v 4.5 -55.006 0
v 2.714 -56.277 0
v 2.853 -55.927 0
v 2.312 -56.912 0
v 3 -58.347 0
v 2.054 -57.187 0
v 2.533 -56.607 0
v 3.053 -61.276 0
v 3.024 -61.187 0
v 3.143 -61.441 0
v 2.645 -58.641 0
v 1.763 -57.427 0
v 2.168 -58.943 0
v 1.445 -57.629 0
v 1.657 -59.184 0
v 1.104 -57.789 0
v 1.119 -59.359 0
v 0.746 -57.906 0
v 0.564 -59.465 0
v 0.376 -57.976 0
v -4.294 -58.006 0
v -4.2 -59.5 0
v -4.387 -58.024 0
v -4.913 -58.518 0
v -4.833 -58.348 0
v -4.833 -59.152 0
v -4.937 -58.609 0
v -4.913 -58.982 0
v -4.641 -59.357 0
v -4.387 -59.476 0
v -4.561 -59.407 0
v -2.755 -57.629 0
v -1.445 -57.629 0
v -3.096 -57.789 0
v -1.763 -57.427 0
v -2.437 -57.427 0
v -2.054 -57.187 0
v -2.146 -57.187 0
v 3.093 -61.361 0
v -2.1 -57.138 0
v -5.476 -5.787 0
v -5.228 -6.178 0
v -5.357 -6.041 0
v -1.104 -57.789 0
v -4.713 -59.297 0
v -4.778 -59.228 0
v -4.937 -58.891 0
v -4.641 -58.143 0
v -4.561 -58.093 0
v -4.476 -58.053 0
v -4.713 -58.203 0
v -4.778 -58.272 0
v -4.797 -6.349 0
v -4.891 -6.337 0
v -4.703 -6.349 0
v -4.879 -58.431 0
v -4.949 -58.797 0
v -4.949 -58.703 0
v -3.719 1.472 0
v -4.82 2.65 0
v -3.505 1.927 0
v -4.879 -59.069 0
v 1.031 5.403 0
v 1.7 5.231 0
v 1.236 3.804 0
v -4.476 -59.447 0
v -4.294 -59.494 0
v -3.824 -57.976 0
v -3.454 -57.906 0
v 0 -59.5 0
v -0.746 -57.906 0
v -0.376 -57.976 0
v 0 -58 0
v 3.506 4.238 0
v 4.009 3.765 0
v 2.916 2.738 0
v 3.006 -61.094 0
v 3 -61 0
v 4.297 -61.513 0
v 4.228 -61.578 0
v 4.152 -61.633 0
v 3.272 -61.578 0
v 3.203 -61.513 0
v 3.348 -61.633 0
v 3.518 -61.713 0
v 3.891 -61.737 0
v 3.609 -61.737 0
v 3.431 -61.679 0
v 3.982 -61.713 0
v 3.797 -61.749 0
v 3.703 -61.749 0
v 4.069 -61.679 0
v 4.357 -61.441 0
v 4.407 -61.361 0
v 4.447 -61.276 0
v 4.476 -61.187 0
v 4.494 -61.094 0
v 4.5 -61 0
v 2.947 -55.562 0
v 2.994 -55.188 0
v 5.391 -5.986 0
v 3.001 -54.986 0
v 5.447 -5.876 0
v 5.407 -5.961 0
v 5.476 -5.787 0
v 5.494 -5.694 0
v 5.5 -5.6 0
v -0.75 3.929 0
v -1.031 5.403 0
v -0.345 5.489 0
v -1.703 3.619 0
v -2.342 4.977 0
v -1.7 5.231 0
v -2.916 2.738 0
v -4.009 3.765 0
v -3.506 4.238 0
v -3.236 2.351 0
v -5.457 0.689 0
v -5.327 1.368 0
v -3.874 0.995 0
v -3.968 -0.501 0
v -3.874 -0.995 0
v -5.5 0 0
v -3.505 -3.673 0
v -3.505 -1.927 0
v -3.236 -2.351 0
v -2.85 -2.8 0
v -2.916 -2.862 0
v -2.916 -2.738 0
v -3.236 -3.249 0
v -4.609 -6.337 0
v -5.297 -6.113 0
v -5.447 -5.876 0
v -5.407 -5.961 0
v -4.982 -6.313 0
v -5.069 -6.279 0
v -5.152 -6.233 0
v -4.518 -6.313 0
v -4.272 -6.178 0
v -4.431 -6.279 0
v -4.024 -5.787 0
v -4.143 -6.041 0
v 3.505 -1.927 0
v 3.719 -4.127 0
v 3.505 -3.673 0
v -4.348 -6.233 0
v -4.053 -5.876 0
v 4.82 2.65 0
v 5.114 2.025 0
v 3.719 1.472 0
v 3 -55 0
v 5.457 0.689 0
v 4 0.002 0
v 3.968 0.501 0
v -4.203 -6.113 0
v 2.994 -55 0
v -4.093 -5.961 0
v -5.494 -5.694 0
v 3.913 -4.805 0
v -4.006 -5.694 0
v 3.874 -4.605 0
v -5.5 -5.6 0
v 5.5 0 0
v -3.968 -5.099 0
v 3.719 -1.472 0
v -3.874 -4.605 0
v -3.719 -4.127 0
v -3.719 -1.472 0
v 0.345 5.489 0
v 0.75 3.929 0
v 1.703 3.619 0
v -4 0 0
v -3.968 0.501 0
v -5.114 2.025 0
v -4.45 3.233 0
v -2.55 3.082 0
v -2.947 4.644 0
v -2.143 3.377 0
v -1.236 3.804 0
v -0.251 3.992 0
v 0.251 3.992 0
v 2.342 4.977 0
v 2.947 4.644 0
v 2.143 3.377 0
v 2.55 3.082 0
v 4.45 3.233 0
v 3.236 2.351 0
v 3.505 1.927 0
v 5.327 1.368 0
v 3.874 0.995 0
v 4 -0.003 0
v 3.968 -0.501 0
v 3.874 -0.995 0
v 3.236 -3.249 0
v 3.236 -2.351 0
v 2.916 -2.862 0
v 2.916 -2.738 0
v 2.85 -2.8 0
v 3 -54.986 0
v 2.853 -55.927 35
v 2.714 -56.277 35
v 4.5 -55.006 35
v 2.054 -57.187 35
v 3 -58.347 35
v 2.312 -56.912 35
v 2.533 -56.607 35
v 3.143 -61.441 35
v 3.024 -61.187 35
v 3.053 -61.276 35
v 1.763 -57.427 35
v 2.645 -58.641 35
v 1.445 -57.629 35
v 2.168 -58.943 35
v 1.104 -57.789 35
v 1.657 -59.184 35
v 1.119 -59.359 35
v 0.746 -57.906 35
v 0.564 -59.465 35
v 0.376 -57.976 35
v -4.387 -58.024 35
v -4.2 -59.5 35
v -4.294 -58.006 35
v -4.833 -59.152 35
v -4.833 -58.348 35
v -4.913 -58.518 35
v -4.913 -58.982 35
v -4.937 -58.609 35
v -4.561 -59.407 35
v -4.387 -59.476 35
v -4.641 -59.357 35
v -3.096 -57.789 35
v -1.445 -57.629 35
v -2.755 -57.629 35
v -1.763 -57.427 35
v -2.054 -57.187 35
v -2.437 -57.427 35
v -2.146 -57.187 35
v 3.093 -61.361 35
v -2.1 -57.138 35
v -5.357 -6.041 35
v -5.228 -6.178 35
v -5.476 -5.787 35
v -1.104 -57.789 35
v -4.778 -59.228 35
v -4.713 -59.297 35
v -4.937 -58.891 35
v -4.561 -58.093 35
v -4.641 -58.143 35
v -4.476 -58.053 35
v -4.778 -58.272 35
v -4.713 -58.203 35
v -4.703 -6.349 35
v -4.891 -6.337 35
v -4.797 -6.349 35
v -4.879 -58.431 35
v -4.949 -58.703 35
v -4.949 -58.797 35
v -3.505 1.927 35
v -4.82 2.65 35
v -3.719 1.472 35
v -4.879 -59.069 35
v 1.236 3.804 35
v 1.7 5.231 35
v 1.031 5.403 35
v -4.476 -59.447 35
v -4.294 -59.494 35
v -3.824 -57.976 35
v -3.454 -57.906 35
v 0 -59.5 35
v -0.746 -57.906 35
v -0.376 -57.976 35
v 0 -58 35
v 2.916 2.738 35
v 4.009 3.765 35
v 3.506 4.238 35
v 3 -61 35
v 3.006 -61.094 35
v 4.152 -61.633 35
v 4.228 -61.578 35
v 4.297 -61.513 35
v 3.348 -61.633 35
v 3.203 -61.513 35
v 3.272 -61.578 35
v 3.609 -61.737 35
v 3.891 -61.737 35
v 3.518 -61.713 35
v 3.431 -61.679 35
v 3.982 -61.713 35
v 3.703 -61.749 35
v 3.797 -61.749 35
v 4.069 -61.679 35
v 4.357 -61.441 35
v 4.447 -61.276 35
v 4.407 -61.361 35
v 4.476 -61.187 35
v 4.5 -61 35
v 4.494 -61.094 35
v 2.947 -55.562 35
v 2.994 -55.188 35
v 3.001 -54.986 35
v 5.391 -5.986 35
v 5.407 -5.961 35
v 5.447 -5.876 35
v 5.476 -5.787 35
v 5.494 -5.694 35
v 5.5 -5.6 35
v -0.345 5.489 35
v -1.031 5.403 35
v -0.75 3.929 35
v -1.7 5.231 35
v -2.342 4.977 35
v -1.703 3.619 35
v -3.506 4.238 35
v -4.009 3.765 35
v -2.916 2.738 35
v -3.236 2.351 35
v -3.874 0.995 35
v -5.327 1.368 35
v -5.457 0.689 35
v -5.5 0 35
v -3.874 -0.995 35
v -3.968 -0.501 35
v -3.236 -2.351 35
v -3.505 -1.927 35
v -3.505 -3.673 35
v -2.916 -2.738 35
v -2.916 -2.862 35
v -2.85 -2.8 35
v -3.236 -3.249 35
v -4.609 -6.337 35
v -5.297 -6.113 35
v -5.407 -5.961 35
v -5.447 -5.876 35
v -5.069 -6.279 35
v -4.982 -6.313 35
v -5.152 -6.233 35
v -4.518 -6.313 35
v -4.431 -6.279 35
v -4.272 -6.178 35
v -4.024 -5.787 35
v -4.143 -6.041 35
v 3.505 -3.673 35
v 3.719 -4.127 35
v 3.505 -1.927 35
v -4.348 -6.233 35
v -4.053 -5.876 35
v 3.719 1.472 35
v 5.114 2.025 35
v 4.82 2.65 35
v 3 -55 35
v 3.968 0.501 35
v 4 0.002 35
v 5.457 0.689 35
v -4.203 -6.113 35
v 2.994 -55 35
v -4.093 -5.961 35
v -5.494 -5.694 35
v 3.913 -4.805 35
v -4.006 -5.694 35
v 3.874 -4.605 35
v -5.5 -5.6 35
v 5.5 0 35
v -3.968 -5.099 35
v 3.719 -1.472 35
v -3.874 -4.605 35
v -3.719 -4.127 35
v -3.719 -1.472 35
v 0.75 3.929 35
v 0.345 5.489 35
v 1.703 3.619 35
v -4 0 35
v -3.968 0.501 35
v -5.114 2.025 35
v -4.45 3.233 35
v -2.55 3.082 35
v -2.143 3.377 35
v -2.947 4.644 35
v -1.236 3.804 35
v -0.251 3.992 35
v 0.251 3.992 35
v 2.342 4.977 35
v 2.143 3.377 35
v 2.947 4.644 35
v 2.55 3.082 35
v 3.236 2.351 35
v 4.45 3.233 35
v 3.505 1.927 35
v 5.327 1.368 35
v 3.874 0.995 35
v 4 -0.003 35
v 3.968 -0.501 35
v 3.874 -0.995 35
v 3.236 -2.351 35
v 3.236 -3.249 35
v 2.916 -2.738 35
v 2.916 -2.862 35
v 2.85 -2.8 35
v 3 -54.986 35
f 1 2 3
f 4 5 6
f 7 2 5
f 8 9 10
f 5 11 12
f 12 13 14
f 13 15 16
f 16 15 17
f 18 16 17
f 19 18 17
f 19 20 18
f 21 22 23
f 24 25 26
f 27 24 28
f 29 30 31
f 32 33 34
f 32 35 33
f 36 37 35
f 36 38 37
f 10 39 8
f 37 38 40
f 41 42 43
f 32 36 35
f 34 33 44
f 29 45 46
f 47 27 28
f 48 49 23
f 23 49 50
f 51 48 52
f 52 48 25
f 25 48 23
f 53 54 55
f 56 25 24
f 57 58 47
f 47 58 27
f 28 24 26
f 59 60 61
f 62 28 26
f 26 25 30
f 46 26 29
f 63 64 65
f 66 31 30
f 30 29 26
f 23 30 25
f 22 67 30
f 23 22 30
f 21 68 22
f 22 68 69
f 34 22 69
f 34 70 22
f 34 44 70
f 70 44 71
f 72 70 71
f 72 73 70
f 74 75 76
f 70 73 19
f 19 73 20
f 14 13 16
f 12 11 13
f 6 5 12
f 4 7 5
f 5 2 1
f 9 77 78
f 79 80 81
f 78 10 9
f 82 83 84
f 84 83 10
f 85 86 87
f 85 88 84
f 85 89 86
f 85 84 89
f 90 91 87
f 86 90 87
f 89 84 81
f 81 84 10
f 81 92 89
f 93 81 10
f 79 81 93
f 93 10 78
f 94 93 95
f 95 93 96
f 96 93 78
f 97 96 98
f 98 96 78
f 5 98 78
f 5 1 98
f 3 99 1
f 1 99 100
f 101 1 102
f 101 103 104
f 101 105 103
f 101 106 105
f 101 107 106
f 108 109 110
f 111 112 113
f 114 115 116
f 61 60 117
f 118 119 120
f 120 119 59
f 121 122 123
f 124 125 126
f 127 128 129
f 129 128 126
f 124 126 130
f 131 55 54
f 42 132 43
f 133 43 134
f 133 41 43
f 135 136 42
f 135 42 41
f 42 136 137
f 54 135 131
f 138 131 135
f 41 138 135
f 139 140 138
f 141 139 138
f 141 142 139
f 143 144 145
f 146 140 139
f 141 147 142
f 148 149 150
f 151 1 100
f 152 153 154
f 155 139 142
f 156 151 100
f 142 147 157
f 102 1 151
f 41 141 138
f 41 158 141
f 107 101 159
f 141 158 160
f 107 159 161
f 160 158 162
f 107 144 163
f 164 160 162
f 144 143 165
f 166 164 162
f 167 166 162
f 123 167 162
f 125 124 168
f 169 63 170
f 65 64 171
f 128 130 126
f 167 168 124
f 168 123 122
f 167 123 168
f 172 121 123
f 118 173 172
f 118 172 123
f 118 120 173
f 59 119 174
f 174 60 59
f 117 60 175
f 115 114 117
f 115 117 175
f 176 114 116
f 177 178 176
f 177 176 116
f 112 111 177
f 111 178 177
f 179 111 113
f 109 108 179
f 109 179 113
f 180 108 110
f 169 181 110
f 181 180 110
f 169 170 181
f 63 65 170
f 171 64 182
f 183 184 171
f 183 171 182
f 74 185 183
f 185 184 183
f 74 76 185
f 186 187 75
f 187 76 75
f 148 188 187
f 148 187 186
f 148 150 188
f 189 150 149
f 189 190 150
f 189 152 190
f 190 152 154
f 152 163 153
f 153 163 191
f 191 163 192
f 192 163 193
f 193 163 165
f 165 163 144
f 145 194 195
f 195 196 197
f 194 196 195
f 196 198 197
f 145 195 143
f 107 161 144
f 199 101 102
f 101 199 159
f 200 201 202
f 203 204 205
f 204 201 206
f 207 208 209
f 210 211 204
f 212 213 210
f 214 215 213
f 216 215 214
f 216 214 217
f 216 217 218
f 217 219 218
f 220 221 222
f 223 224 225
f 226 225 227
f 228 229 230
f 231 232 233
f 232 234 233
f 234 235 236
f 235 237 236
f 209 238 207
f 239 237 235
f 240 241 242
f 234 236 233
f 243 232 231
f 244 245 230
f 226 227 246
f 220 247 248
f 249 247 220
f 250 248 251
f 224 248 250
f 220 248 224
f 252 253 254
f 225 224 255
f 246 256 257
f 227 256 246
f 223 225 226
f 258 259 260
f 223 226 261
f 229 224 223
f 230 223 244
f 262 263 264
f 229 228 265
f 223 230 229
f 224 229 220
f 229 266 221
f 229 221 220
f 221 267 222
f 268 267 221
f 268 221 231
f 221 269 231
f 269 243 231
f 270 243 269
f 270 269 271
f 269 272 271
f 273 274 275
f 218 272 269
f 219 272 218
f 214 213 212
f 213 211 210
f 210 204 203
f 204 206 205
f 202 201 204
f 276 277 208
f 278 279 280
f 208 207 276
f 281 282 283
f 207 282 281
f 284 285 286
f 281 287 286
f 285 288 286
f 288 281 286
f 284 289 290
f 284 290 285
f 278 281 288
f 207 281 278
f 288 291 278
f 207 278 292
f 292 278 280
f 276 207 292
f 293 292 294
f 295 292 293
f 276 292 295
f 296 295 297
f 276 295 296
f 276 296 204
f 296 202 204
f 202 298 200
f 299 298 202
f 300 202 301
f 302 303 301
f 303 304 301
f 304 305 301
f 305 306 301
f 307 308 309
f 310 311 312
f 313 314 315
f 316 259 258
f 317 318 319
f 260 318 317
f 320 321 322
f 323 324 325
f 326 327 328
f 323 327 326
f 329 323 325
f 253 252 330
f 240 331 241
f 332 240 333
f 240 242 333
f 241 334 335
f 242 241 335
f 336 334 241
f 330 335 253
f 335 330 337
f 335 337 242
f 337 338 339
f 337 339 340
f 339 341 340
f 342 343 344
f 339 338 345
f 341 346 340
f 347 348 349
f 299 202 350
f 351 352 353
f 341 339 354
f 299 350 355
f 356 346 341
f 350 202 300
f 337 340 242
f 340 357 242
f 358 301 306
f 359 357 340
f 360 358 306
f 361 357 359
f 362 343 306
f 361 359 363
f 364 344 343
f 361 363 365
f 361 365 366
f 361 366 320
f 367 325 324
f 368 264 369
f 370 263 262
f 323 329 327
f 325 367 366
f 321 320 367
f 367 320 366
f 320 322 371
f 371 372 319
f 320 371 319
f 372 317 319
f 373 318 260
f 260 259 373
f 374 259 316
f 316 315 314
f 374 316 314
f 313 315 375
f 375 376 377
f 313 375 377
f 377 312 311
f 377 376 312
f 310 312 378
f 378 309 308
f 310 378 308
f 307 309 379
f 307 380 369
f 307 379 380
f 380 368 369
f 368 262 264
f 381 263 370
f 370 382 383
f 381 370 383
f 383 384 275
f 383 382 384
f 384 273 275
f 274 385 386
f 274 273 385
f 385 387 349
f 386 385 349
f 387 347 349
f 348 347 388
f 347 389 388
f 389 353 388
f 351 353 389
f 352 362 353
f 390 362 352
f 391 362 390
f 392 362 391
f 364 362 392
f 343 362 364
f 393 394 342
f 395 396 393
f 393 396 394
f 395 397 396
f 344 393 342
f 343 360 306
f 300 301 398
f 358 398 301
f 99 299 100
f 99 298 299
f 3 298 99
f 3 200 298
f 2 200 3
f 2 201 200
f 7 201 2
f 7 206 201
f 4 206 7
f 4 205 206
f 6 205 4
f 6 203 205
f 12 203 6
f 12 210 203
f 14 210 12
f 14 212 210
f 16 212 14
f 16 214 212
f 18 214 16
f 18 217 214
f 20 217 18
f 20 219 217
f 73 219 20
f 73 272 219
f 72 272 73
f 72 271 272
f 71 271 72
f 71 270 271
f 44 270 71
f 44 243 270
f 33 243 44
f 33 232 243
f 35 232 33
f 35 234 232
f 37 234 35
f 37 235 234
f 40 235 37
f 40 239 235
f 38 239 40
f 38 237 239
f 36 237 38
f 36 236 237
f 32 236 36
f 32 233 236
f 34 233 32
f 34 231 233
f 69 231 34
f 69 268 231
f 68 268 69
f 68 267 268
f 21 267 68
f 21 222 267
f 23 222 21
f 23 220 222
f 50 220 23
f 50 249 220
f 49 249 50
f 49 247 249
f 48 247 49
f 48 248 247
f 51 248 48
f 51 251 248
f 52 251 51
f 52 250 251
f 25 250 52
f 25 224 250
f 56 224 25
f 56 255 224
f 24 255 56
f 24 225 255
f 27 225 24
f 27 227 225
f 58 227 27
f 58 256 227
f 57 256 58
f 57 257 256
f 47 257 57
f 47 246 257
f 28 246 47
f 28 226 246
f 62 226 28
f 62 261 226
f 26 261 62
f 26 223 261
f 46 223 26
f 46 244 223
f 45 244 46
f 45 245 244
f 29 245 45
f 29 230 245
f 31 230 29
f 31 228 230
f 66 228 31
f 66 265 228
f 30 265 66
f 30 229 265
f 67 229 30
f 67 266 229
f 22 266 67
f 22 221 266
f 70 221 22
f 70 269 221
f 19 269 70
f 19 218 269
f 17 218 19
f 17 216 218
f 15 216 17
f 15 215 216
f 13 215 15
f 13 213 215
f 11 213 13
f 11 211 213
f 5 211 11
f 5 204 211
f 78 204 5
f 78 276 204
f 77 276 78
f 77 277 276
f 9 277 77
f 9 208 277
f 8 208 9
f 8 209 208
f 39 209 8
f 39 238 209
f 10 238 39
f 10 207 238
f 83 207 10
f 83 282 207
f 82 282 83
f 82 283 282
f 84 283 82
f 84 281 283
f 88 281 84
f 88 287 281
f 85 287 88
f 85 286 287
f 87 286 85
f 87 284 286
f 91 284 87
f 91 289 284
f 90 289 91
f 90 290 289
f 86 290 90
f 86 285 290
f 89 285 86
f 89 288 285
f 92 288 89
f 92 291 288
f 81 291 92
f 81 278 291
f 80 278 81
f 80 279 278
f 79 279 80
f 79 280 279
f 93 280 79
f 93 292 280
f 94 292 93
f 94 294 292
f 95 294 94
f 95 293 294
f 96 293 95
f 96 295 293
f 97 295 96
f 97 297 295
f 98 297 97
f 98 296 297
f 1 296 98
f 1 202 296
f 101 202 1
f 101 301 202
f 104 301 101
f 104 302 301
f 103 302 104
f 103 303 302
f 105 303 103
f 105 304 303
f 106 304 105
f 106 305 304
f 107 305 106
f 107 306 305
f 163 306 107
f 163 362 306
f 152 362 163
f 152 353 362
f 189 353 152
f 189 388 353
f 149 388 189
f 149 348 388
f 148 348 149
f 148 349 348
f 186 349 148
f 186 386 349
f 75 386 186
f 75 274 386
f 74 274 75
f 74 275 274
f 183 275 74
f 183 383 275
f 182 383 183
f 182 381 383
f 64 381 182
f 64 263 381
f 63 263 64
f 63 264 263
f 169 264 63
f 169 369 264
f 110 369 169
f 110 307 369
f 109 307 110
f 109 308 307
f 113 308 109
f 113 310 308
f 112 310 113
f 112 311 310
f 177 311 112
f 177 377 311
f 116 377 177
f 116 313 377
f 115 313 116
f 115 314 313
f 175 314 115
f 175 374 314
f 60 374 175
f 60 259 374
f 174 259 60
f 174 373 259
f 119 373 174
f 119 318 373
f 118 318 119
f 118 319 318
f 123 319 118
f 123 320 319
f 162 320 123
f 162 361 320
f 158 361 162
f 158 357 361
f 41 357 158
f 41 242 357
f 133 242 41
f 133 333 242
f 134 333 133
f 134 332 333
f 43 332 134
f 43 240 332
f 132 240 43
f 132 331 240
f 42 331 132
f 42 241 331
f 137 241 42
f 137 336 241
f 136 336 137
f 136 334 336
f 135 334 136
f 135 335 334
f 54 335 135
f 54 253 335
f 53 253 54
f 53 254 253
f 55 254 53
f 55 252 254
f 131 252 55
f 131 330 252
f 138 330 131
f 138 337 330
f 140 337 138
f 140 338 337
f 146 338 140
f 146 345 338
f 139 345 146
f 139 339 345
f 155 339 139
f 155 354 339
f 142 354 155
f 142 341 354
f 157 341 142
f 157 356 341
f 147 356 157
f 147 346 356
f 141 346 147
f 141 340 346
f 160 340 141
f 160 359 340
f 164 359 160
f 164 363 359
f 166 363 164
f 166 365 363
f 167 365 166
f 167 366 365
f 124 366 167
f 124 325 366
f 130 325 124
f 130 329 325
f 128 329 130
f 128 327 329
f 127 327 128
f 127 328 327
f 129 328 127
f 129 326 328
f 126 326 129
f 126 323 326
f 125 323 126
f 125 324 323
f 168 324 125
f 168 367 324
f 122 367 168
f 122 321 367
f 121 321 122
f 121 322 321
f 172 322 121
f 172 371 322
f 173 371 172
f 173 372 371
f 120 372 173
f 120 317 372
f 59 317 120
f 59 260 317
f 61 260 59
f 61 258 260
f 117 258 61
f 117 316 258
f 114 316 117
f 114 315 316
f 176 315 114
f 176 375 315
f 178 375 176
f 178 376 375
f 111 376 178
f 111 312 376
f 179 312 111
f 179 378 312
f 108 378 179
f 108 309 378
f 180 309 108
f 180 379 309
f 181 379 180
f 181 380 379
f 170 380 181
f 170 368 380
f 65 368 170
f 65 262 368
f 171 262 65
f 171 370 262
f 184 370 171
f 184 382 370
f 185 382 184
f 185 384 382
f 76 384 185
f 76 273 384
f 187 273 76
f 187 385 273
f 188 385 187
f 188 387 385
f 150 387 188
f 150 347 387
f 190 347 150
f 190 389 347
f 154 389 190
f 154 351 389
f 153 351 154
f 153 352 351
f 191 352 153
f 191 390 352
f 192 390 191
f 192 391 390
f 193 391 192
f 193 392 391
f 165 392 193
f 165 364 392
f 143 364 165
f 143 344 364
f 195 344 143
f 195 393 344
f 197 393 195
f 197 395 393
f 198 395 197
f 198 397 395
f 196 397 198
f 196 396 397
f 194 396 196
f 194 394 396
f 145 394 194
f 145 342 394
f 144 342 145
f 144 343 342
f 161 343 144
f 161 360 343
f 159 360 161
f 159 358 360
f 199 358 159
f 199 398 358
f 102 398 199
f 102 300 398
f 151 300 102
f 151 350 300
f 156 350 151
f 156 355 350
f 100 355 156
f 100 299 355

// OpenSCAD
// This is the overal width of the clip
ZExtrude = 35; // 
// This is the diameter of the top bar
topdia = 8; //
// This is the diameter of the bottom bar
bottomDiam = 6; //
// This is the distance between the top and bottom bar, as centres
spacebetween = 55;//
// This Chooses the thickness of the material
Thickness = 1.5;

linear_extrude(ZExtrude) {

Clip(topdia,bottomDiam,spacebetween,Thickness);

}
module Clip(topdia,bottomDiam,spacebetween,Thickness) {
	
	union(){
		click(topdia , Thickness);
		
		click(bottomDiam , Thickness, [0,-spacebetween],-90, false);
	
   
		Line([(topdia+Thickness)/2,0],[(bottomDiam+Thickness)/2,-spacebetween],Thickness);
		Line([(bottomDiam+Thickness)/2,-spacebetween],[(bottomDiam+Thickness)/2, -spacebetween-bottomDiam],Thickness);

	}
}
module click(size,thickness, XY = [0,0],Angle = 0, full = true) {
	
	YMovement = -size*0.7;
	CentrePoint = [0,YMovement/2];
	OuterDiameter = size+(thickness*2);
	ConstantDistance = (size+thickness)/2;
	
	
	translate (XY) {
		rotate ([0,0,Angle]) {
			
			difference() {

				union() {
					// point ();
					
					circle(d = OuterDiameter, $fn=50, center = true);
					
					translate(CentrePoint) {
						square([OuterDiameter,-YMovement], center = true);
					}
				
					point ([ConstantDistance,YMovement], thickness);
					point ([-ConstantDistance,YMovement], thickness);					
				
				}
							
				union() {
					// point ();
					
					circle(d = size, $fn=50, center = true);
					
					translate([0,YMovement]) {
						circle(d = size, $fn=50, center = true);
					}	
					
					if (full!=true){
						
						translate([-ConstantDistance,YMovement/2]) {
							square([ConstantDistance*2,ConstantDistance*4], center = true);
						}
											
					}
									
				}	
			}
		}
	}
}		
module Line( XY1 , XY2 , Thickness ) {
	
	Ad = XY1 [0] - XY2[0];
	Op = XY1 [1] - XY2[1];
	Hyp = sqrt(pow(Op,2) + pow(Ad,2) );
	Angle = atan(Op/Ad);
	
	translate (Mid (XY1,XY2)){
		rotate([0,0,Angle]){
			square ([Hyp,Thickness], center = true);
		}		
	}
	
	point(XY1,Thickness);
	point(XY2,Thickness);
}

function Mid (XYstart,XYfin) = (XYstart + XYfin) / 2;
module point (XY = [0,0] , Size = 1) {

	translate(XY) {
	
	circle(d = Size, $fn=50, center = true);
	
	}
}
